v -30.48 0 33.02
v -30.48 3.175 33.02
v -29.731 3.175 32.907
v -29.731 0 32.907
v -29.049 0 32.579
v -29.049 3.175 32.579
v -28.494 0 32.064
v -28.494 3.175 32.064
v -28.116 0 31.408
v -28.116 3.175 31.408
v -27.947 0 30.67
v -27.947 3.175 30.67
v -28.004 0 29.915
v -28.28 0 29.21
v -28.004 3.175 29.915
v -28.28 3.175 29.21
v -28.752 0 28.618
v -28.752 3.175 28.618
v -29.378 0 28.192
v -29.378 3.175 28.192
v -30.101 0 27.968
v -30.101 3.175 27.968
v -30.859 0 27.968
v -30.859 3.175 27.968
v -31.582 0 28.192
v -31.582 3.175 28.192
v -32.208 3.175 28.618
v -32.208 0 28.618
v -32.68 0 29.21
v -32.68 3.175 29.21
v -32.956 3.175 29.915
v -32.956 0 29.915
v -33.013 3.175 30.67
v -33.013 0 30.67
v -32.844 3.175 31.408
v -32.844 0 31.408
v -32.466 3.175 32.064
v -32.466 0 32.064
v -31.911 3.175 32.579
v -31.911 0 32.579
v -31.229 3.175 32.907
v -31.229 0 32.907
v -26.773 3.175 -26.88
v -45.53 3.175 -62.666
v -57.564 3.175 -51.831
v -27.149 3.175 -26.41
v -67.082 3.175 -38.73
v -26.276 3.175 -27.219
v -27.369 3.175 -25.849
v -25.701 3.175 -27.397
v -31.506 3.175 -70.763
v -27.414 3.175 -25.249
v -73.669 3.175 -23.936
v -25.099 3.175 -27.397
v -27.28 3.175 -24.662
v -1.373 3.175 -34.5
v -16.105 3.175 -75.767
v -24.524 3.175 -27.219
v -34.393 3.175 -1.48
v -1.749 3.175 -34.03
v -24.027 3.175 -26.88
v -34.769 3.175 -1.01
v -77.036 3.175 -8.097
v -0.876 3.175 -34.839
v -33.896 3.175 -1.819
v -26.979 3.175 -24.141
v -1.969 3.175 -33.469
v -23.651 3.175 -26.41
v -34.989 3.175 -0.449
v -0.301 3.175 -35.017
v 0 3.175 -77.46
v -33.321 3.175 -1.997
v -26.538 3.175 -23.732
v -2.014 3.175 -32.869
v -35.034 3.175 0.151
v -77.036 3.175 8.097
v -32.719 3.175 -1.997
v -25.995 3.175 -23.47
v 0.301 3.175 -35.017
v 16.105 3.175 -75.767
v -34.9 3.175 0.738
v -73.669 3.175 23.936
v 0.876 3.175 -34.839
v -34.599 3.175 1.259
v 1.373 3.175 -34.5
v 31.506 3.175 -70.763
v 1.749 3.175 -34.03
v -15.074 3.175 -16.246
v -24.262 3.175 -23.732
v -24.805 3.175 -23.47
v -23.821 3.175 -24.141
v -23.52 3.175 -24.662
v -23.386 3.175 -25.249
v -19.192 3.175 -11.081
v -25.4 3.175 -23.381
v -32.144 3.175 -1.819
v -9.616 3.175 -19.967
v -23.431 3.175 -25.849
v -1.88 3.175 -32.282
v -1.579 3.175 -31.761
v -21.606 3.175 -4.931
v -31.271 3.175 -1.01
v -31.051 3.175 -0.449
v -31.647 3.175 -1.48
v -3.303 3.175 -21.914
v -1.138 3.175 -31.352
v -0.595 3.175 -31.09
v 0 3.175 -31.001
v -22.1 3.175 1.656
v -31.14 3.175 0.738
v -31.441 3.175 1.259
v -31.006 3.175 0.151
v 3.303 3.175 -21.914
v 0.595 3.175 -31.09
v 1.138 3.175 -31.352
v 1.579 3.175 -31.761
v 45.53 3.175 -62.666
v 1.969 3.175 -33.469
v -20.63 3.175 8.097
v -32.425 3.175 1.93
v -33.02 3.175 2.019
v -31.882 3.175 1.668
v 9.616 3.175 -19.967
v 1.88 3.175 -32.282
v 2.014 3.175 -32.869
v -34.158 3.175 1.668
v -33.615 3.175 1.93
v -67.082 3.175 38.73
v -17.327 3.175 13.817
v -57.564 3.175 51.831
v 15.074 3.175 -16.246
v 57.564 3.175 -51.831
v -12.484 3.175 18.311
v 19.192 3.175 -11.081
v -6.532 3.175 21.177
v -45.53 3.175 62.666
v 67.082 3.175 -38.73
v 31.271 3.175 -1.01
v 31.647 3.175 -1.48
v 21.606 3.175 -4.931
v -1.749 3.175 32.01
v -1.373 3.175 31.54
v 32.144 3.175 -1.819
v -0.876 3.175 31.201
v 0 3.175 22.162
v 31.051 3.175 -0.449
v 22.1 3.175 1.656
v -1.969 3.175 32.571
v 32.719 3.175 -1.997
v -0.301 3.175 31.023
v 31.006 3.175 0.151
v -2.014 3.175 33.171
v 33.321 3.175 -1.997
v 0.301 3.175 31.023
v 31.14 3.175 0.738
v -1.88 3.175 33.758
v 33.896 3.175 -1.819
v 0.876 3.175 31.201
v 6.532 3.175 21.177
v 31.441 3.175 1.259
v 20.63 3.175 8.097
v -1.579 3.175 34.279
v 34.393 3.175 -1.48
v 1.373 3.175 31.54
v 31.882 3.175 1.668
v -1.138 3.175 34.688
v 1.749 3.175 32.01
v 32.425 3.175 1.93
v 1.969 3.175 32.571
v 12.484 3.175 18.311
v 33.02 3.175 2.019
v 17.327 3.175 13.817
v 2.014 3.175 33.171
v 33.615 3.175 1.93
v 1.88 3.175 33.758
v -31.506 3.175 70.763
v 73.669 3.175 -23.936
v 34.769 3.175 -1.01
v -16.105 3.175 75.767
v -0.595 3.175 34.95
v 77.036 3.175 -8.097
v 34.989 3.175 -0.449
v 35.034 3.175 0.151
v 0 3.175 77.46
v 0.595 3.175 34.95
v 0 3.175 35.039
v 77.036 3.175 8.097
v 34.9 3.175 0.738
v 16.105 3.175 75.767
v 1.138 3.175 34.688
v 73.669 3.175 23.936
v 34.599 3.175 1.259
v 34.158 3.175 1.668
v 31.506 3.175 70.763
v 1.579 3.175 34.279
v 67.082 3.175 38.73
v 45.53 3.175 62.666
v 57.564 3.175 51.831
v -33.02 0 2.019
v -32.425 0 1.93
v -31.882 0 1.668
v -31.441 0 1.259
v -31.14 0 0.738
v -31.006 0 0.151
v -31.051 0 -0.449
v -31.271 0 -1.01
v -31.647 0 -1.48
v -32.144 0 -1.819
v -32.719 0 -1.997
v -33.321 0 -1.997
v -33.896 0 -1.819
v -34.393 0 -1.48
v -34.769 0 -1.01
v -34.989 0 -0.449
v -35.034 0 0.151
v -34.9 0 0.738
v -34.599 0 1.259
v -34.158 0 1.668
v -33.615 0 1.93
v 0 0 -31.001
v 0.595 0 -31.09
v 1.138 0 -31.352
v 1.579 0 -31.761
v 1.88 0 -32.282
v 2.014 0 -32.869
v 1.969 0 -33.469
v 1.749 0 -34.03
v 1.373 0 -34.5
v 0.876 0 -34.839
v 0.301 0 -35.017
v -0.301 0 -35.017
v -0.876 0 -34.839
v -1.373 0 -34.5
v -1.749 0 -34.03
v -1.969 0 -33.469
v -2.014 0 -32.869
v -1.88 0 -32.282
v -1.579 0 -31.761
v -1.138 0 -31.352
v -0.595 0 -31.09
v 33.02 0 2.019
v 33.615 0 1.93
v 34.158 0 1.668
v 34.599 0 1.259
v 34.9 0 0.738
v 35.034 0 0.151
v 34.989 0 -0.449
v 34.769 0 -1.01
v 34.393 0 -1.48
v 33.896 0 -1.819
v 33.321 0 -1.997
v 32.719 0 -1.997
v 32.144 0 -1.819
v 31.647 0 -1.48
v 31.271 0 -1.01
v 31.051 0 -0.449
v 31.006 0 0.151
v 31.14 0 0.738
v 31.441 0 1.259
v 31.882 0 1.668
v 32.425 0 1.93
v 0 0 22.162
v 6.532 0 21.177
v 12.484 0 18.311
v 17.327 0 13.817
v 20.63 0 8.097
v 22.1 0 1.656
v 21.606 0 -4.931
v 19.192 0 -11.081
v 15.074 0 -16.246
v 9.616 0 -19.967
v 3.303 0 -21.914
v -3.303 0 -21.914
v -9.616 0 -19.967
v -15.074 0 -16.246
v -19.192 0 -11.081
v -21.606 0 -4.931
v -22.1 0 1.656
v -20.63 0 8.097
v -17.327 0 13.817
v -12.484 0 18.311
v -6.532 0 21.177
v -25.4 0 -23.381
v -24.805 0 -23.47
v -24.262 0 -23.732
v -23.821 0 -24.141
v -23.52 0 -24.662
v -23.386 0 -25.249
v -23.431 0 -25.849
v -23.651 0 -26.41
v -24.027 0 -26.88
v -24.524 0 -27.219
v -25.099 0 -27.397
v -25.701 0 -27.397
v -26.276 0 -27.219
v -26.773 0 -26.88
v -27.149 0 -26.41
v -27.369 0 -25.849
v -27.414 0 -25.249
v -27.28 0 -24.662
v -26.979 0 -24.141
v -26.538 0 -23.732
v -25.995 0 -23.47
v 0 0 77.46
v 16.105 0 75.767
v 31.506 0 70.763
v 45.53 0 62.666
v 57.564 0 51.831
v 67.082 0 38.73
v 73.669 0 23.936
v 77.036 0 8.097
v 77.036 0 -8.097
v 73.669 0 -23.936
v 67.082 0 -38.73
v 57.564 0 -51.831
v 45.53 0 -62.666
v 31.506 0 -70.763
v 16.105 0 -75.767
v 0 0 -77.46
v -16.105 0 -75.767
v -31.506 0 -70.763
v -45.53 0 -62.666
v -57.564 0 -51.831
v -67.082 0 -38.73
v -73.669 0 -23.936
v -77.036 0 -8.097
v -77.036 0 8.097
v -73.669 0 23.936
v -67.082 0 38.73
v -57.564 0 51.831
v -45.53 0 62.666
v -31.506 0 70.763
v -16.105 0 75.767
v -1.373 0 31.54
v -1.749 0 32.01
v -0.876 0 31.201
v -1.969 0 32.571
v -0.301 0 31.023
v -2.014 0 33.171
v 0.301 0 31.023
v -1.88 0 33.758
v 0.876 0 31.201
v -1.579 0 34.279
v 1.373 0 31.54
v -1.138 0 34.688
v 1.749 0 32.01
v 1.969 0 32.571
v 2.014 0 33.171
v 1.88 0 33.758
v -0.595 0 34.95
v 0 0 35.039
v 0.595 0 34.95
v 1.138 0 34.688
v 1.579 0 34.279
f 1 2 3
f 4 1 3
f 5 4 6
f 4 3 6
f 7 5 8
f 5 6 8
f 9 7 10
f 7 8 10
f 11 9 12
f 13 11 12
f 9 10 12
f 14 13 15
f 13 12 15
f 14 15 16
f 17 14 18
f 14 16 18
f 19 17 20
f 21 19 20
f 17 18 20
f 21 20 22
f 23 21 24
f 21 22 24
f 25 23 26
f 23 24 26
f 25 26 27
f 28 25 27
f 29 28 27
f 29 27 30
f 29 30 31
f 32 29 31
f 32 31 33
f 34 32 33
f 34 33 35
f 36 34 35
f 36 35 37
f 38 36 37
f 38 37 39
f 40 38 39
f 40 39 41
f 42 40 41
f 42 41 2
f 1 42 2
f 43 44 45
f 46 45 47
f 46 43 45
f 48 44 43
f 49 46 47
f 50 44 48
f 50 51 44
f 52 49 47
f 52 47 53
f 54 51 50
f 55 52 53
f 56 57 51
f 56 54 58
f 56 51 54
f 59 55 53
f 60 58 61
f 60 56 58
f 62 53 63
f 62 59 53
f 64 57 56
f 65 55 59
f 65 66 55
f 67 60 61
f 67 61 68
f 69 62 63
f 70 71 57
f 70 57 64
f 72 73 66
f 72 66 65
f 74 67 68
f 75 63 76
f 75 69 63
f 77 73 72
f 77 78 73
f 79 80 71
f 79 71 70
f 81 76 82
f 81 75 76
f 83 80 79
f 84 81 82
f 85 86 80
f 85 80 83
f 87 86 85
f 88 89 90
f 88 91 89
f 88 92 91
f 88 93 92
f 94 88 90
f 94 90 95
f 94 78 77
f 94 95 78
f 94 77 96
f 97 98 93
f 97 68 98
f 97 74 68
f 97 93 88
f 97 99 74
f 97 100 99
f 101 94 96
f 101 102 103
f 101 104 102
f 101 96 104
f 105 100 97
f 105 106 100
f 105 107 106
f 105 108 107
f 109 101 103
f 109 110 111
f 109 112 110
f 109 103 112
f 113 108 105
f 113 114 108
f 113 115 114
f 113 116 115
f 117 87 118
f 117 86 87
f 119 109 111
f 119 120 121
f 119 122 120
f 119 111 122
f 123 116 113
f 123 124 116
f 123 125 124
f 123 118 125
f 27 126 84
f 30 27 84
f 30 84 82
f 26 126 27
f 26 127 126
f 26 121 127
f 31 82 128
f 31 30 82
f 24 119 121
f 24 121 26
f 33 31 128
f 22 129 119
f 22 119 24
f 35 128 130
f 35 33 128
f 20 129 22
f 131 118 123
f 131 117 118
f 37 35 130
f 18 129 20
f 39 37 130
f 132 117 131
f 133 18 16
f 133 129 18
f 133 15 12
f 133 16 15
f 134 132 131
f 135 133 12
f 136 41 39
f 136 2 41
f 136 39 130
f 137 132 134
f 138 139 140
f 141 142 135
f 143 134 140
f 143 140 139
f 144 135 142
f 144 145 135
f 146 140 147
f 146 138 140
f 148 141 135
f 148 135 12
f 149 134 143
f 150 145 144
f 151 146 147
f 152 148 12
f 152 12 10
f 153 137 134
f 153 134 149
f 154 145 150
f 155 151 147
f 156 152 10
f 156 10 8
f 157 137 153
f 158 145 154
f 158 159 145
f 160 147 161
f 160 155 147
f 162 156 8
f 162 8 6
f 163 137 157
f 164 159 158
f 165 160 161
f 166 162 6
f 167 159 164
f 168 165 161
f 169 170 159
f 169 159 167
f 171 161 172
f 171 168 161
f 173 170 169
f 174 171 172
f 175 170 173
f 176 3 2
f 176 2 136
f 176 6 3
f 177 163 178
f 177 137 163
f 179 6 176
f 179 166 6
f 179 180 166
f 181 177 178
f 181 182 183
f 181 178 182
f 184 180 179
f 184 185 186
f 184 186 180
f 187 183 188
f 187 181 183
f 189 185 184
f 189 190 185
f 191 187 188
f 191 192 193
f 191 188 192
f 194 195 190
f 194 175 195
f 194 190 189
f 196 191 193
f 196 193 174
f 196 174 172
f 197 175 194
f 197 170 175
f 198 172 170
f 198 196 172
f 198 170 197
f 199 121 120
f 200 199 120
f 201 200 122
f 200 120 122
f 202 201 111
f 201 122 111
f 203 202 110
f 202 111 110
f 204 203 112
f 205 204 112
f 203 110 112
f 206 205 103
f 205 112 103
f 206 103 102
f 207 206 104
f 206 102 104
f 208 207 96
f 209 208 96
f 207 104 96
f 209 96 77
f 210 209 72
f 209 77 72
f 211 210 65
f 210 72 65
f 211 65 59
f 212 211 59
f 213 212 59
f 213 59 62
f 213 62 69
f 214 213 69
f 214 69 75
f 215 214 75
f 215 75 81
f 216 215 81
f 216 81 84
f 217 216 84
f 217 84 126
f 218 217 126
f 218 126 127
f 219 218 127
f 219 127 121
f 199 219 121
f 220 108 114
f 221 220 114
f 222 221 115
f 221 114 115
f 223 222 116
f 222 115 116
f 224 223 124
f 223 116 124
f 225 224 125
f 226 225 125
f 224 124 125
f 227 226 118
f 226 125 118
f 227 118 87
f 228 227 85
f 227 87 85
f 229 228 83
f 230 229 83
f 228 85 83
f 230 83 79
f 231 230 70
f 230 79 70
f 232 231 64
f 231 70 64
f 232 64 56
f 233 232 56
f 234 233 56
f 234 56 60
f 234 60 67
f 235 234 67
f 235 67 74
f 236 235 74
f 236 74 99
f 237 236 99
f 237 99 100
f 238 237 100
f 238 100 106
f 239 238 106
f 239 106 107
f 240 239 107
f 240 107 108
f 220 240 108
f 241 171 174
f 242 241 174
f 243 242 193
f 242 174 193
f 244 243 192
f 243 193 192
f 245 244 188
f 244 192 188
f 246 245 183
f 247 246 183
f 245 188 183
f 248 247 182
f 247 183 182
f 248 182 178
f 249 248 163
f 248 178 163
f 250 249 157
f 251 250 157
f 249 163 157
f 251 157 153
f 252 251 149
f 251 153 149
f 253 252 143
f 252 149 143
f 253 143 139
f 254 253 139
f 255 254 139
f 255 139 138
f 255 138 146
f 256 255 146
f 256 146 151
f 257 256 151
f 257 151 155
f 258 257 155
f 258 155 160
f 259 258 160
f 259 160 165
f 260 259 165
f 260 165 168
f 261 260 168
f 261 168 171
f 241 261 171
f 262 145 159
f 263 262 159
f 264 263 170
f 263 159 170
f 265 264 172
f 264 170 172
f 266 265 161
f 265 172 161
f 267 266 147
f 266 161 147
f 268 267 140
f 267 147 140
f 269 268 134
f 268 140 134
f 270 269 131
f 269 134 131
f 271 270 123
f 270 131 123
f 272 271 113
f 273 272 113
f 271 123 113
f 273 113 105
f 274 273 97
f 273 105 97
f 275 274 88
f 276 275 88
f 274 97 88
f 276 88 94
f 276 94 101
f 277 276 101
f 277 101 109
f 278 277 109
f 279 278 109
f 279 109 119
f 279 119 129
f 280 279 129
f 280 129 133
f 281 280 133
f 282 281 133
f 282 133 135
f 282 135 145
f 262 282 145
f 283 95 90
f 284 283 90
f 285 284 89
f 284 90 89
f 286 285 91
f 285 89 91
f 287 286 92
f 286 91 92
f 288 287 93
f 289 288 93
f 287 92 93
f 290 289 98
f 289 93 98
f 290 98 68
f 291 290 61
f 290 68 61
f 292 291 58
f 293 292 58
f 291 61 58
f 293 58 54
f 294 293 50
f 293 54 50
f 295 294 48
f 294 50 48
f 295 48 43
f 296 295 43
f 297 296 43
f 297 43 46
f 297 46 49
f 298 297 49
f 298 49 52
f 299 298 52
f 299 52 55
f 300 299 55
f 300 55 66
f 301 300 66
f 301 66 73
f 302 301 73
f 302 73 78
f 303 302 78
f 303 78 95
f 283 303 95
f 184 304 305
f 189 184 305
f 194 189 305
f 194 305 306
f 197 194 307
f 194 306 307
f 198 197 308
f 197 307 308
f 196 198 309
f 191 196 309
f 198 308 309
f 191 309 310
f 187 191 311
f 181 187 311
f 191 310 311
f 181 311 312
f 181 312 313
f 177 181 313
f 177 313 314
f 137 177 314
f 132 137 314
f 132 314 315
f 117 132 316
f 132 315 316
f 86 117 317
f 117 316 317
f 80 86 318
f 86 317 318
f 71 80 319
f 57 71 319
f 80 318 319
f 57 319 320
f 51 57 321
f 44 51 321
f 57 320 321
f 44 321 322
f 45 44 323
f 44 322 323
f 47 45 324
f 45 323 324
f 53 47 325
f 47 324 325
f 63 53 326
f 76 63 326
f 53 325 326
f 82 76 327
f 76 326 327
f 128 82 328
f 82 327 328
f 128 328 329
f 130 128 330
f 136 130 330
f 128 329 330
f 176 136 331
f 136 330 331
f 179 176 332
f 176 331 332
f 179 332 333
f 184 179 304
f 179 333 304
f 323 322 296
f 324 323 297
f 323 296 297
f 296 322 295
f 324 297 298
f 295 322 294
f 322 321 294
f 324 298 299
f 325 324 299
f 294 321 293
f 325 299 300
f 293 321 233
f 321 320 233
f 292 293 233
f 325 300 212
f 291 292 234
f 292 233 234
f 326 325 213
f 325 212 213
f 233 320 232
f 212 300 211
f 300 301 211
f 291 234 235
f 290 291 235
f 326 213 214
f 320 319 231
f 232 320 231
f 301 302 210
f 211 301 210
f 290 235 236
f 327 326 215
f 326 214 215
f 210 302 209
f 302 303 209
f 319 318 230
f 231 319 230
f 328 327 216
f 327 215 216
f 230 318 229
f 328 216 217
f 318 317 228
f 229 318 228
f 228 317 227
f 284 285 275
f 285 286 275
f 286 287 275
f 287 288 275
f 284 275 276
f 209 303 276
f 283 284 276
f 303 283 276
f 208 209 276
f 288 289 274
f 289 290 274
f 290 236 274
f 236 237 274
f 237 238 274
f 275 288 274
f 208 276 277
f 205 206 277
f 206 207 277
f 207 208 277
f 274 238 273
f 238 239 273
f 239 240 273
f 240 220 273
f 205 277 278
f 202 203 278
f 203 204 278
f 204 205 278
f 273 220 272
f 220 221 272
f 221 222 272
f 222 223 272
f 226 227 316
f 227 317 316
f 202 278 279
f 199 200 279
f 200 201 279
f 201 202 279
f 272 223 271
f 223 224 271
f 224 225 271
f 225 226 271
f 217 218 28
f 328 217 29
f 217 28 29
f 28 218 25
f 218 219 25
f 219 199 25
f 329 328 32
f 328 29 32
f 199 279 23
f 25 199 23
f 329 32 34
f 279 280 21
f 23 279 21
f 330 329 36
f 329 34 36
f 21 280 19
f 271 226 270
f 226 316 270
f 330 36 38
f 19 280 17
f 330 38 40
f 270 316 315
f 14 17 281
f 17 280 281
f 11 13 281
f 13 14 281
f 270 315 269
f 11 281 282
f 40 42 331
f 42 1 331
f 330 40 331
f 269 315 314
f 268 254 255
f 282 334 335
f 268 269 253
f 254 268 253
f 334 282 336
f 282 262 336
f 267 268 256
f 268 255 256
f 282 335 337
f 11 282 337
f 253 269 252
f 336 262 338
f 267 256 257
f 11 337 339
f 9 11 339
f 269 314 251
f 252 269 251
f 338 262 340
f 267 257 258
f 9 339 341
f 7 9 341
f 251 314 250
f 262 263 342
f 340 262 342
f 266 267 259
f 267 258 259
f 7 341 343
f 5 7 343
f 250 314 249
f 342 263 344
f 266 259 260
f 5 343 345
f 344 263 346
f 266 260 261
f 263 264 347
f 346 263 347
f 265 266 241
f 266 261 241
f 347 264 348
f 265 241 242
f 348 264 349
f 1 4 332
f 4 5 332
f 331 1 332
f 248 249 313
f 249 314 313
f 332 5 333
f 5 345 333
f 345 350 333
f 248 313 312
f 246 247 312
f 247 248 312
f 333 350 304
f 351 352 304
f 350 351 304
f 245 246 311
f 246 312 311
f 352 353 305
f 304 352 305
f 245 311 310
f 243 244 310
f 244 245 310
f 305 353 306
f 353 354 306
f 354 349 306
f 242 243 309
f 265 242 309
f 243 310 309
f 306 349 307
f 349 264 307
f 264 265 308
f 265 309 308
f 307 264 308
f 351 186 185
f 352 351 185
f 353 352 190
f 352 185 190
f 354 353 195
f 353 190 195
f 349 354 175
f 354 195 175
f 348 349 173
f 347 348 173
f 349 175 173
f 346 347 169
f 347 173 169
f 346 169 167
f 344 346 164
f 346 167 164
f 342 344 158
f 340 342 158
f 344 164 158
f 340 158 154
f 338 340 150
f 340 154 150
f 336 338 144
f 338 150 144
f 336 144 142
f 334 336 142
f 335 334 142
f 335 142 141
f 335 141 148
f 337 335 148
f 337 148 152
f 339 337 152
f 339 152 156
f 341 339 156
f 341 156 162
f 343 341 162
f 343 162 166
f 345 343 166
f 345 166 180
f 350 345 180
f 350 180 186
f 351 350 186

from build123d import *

# Parameters (mm, degrees)
SKETCH1_R           = 77.4600051
BOSS_EXTRUDE1_DEPTH = 3.175
SKETCH24_R          = 22.1615
SKETCH24_R_2        = 2.54
SKETCH24_R_3        = 2.0193
CUT_EXTRUDE14_DEPTH = 110.590991442


with BuildPart() as part:
    # Sketch1 → Boss-Extrude1 (new body)
    with BuildSketch(Plane(origin=(0, 0, 0), x_dir=(1, 0, 0), z_dir=(0, 1, 0))):
        with Locations(Location((0, 0, 0), (0, 0, 270))):
            Circle(SKETCH1_R)
    extrude(amount=BOSS_EXTRUDE1_DEPTH)

    # Sketch24 → Cut-Extrude14 (cut, through all)
    with BuildSketch(Plane(origin=(0, 3.175, 0), x_dir=(1, 0, 0), z_dir=(0, 1, 0))):
        with Locations(Location((0, 0, 0), (0, 0, 270))):
            Circle(SKETCH24_R)
        with Locations(Location((-30.48, -30.48, 0), (0, 0, 270))):
            Circle(SKETCH24_R_2)
        with Locations(Location((0, -33.02, 0), (0, 0, 270))):
            Circle(SKETCH24_R_3)
        with Locations(Location((33.02, 0, 0), (0, 0, 270))):
            Circle(SKETCH24_R_3)
        with Locations(Location((0, 33.02, 0), (0, 0, 270))):
            Circle(SKETCH24_R_3)
        with Locations(Location((-33.02, 0, 0), (0, 0, 270))):
            Circle(SKETCH24_R_3)
        with Locations(Location((-25.4, 25.4, 0), (0, 0, 270))):
            Circle(SKETCH24_R_3)
    extrude(amount=-CUT_EXTRUDE14_DEPTH, mode=Mode.SUBTRACT)


solid = part.part
